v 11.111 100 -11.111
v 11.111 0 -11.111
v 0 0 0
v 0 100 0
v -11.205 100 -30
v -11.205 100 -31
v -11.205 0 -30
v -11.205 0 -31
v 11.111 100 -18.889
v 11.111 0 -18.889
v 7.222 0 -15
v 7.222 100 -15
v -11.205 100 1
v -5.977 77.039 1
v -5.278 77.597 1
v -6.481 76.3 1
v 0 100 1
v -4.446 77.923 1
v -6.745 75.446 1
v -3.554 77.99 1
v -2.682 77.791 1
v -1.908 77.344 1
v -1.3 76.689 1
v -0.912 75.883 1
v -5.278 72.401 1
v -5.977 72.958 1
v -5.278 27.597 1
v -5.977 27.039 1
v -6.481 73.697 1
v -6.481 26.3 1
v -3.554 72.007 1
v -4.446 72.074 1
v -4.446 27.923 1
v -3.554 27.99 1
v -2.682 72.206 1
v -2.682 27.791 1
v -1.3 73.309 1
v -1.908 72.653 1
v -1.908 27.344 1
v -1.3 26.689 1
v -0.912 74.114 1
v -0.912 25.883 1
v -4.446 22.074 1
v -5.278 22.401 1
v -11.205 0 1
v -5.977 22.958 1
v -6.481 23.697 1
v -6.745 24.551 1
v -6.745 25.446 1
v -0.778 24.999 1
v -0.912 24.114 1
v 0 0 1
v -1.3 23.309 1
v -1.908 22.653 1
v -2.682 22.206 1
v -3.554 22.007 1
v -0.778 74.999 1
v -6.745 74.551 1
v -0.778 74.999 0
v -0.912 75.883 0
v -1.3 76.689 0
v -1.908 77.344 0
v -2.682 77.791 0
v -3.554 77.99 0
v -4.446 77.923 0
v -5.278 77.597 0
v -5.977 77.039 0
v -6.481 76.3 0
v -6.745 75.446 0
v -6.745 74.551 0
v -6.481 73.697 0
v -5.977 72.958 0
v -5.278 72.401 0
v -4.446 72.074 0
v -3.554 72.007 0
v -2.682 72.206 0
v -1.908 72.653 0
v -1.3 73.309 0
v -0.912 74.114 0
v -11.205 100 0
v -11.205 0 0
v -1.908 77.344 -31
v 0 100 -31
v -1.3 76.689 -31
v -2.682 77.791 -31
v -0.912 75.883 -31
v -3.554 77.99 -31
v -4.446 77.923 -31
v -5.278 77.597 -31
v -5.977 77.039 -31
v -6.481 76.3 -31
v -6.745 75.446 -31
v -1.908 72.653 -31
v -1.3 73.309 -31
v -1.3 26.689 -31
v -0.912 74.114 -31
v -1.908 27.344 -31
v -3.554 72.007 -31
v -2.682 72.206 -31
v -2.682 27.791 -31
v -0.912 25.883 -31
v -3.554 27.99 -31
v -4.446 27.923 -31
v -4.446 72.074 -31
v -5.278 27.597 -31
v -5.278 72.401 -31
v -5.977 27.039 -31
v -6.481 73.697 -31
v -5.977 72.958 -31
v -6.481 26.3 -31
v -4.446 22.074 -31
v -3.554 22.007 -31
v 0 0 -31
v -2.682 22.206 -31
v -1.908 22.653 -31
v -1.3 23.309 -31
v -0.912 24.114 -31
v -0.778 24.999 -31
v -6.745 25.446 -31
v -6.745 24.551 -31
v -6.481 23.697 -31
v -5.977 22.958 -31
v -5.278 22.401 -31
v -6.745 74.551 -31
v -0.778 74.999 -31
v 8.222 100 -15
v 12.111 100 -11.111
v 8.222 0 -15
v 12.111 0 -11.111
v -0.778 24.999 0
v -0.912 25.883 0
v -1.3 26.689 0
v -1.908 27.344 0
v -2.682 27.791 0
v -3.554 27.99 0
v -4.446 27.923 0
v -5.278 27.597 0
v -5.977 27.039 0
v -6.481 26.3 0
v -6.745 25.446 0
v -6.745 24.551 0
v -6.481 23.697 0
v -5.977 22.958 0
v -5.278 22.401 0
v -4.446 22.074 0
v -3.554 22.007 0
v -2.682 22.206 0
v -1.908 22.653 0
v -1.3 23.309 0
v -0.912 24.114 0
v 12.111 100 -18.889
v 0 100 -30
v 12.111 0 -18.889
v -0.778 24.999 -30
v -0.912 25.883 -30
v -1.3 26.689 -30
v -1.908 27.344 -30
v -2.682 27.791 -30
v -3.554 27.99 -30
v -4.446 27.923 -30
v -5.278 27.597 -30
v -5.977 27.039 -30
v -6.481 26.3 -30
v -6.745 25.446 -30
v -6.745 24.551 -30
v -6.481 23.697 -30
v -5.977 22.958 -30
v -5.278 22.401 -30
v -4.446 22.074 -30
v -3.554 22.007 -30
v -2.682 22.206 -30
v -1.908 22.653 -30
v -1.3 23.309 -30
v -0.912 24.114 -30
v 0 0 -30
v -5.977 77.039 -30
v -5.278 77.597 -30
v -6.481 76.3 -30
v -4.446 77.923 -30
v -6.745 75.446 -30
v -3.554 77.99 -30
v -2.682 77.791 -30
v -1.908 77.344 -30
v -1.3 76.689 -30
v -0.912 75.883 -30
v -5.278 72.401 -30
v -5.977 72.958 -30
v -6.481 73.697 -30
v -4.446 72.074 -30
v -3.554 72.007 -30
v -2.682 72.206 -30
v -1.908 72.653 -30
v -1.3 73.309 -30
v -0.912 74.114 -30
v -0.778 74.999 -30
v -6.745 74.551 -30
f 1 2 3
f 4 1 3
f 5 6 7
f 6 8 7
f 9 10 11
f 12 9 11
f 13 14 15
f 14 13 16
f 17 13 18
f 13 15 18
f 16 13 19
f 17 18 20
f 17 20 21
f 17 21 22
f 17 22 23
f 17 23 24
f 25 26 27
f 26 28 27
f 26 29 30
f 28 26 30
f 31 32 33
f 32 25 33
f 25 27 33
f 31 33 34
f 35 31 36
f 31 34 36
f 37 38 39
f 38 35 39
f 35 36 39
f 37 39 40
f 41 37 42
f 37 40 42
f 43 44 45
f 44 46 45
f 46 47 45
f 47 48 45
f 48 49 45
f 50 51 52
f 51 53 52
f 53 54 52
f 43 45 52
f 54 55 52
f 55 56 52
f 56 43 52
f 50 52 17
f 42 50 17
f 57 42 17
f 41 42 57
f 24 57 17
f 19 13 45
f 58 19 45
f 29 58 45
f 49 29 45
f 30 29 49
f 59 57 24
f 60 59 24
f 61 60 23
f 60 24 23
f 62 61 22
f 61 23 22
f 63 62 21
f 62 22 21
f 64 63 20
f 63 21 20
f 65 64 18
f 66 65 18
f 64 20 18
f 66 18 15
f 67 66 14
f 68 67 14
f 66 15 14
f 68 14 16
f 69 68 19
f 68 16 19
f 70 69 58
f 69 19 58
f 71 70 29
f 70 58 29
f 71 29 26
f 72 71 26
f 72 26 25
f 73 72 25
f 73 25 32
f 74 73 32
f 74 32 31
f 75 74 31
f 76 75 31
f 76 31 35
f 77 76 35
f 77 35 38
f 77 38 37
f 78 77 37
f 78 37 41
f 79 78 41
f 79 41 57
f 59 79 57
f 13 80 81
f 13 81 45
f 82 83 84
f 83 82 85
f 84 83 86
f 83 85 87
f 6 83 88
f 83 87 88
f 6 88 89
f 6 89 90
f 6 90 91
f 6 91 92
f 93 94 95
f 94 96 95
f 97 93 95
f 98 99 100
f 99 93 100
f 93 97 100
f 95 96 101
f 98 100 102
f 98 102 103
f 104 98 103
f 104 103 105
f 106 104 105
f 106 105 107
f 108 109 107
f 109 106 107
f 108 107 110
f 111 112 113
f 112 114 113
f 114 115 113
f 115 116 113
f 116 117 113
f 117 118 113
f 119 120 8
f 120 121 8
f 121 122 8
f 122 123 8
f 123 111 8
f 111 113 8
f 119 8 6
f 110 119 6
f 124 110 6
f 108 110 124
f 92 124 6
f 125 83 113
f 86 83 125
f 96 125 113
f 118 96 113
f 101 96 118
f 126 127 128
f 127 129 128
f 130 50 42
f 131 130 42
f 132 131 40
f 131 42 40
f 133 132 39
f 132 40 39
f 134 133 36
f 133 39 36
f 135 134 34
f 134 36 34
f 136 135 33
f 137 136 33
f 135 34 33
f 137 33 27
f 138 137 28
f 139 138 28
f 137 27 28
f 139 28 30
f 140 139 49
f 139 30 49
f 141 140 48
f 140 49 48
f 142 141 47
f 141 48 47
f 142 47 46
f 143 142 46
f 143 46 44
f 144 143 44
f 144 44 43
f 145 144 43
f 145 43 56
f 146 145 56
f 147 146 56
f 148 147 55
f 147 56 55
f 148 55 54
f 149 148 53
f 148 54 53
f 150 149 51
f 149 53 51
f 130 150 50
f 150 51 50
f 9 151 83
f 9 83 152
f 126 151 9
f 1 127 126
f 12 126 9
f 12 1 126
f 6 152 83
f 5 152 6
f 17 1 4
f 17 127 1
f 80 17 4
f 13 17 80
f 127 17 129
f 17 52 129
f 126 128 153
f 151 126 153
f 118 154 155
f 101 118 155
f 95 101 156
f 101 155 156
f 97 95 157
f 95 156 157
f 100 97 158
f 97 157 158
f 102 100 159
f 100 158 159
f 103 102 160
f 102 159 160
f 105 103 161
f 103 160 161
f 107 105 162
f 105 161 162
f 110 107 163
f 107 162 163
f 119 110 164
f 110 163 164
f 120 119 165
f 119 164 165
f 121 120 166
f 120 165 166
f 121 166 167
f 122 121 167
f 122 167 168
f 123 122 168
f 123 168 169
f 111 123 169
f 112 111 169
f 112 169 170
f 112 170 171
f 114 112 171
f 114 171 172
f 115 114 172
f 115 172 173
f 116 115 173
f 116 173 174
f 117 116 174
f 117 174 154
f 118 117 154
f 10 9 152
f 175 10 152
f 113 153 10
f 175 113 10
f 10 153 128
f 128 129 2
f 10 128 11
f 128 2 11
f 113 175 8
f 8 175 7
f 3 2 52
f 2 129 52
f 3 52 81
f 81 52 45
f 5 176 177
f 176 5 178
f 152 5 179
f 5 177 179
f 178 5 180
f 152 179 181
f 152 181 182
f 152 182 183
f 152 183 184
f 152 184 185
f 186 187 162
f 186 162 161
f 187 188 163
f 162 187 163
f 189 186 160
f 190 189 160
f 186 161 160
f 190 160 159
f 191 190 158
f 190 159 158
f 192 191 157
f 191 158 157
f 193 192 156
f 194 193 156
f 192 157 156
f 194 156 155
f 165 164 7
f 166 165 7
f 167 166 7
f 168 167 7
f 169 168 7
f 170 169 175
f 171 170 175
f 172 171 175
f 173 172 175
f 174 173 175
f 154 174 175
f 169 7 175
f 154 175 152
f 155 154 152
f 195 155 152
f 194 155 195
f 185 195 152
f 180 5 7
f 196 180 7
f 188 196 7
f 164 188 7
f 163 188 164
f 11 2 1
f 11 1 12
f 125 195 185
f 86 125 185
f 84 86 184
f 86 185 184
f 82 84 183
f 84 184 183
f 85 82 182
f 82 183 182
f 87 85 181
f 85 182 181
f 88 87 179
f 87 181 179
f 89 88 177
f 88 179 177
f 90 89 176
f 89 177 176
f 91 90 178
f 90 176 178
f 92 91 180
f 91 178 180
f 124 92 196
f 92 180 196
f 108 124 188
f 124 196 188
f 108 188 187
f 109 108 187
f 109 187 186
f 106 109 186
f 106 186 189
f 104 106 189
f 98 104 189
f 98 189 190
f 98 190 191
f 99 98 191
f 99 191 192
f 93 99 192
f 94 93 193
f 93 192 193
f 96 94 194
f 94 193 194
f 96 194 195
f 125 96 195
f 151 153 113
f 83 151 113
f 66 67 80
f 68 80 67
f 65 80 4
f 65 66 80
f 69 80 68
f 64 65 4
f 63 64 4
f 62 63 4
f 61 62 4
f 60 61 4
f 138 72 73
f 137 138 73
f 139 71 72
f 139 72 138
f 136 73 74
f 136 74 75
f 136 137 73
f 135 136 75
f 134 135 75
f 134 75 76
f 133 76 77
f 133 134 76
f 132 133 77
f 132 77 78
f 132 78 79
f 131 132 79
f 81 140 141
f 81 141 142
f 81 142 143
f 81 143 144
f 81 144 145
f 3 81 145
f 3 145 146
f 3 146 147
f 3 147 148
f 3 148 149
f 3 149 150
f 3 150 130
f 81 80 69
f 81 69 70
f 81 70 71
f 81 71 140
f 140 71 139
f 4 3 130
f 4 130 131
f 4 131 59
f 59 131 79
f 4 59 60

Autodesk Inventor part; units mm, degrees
ref_plane "YZ Plane" through (0, 0, 0) normal (1, 0, 0) x (0, 1, 0)
ref_plane "XZ Plane" through (0, 0, 0) normal (0, 1, 0) x (-1, 0, 0)
ref_plane "XY Plane" through (0, 0, 0) normal (0, 0, 1) x (1, 0, 0)
sketch "Sketch1" plane through (0, 0, 0) normal (0, 1, 0) x (-1, 0, 0)
  line L0 (0, 0) -> (11.2054, 0) construction
  line L1 (11.2054, 0) -> (0, 0) construction
  line L2 (-7.2218, -15) -> (-11.1109, -11.1109) construction
  line L3 (0, 0) -> (-11.1109, -11.1109) construction
  line L4 (-11.1109, -11.1109) -> (-7.2218, -15) construction
  line L5 (-11.1109, -18.8891) -> (0, -30) construction
  line L6 (-7.2218, -15) -> (-11.1109, -18.8891) construction
  line L7 (0, -30) -> (11.2054, -30) construction
  line L8 (11.2054, -30) -> (0, -30) construction
  line L9 (11.2054, -30) -> (11.2054, 0) construction
  line L10 (11.2054, 0) -> (11.2054, -30) construction
  line L11 (11.2054, 0) -> (11.2054, 1)
  line L12 (11.2054, 1) -> (0, 1)
  line L13 (0, 1) -> (-12.1109, -11.1109)
  line L14 (-12.1109, -11.1109) -> (-8.2218, -15)
  line L15 (-8.2218, -15) -> (-12.1109, -18.8891)
  line L16 (-12.1109, -18.8891) -> (0, -31)
  line L17 (0, -31) -> (11.2054, -31)
  line L18 (11.2054, -31) -> (11.2054, -30)
  line L19 (11.2054, -30) -> (0, -30)
  line L20 (-11.1109, -18.8891) -> (0, -30)
  line L21 (-11.1109, -18.8891) -> (-7.2218, -15)
  line L22 (-11.1109, -11.1109) -> (0, 0)
  line L23 (-11.1109, -11.1109) -> (-7.2218, -15)
  line L24 (11.2054, 0) -> (0, 0)
  point P0 (-20.2218, 0)
  dimension "d0" = 1
extrude "Extrusion1" add sketch "Sketch1" along normal blind 100
sketch "Sketch3" plane through (-11.2054, 0, 1) normal (0, 0, 1) x (1, 0, 0)
  line L0 (11.2053, -0.0014) -> (11.2053, 99.9986)
  line L1 (11.2053, 99.9986) -> (7.4271, 77.9986)
  circle A0 centre (7.4271, 74.9986) radius 3
  circle A1 centre (7.4271, 74.9986) radius 3
  line L2 (7.4271, 71.9986) -> (7.4271, 27.9986)
  circle A2 centre (7.4271, 24.9986) radius 3
  circle A3 centre (7.4271, 24.9986) radius 3
  point P0 (11.2054, 0)
  point P1 (0, 0)
extrude "Extrusion2" cut sketch "Sketch3" against normal up to surface (32 mm away)
properties part number "guardv2"
